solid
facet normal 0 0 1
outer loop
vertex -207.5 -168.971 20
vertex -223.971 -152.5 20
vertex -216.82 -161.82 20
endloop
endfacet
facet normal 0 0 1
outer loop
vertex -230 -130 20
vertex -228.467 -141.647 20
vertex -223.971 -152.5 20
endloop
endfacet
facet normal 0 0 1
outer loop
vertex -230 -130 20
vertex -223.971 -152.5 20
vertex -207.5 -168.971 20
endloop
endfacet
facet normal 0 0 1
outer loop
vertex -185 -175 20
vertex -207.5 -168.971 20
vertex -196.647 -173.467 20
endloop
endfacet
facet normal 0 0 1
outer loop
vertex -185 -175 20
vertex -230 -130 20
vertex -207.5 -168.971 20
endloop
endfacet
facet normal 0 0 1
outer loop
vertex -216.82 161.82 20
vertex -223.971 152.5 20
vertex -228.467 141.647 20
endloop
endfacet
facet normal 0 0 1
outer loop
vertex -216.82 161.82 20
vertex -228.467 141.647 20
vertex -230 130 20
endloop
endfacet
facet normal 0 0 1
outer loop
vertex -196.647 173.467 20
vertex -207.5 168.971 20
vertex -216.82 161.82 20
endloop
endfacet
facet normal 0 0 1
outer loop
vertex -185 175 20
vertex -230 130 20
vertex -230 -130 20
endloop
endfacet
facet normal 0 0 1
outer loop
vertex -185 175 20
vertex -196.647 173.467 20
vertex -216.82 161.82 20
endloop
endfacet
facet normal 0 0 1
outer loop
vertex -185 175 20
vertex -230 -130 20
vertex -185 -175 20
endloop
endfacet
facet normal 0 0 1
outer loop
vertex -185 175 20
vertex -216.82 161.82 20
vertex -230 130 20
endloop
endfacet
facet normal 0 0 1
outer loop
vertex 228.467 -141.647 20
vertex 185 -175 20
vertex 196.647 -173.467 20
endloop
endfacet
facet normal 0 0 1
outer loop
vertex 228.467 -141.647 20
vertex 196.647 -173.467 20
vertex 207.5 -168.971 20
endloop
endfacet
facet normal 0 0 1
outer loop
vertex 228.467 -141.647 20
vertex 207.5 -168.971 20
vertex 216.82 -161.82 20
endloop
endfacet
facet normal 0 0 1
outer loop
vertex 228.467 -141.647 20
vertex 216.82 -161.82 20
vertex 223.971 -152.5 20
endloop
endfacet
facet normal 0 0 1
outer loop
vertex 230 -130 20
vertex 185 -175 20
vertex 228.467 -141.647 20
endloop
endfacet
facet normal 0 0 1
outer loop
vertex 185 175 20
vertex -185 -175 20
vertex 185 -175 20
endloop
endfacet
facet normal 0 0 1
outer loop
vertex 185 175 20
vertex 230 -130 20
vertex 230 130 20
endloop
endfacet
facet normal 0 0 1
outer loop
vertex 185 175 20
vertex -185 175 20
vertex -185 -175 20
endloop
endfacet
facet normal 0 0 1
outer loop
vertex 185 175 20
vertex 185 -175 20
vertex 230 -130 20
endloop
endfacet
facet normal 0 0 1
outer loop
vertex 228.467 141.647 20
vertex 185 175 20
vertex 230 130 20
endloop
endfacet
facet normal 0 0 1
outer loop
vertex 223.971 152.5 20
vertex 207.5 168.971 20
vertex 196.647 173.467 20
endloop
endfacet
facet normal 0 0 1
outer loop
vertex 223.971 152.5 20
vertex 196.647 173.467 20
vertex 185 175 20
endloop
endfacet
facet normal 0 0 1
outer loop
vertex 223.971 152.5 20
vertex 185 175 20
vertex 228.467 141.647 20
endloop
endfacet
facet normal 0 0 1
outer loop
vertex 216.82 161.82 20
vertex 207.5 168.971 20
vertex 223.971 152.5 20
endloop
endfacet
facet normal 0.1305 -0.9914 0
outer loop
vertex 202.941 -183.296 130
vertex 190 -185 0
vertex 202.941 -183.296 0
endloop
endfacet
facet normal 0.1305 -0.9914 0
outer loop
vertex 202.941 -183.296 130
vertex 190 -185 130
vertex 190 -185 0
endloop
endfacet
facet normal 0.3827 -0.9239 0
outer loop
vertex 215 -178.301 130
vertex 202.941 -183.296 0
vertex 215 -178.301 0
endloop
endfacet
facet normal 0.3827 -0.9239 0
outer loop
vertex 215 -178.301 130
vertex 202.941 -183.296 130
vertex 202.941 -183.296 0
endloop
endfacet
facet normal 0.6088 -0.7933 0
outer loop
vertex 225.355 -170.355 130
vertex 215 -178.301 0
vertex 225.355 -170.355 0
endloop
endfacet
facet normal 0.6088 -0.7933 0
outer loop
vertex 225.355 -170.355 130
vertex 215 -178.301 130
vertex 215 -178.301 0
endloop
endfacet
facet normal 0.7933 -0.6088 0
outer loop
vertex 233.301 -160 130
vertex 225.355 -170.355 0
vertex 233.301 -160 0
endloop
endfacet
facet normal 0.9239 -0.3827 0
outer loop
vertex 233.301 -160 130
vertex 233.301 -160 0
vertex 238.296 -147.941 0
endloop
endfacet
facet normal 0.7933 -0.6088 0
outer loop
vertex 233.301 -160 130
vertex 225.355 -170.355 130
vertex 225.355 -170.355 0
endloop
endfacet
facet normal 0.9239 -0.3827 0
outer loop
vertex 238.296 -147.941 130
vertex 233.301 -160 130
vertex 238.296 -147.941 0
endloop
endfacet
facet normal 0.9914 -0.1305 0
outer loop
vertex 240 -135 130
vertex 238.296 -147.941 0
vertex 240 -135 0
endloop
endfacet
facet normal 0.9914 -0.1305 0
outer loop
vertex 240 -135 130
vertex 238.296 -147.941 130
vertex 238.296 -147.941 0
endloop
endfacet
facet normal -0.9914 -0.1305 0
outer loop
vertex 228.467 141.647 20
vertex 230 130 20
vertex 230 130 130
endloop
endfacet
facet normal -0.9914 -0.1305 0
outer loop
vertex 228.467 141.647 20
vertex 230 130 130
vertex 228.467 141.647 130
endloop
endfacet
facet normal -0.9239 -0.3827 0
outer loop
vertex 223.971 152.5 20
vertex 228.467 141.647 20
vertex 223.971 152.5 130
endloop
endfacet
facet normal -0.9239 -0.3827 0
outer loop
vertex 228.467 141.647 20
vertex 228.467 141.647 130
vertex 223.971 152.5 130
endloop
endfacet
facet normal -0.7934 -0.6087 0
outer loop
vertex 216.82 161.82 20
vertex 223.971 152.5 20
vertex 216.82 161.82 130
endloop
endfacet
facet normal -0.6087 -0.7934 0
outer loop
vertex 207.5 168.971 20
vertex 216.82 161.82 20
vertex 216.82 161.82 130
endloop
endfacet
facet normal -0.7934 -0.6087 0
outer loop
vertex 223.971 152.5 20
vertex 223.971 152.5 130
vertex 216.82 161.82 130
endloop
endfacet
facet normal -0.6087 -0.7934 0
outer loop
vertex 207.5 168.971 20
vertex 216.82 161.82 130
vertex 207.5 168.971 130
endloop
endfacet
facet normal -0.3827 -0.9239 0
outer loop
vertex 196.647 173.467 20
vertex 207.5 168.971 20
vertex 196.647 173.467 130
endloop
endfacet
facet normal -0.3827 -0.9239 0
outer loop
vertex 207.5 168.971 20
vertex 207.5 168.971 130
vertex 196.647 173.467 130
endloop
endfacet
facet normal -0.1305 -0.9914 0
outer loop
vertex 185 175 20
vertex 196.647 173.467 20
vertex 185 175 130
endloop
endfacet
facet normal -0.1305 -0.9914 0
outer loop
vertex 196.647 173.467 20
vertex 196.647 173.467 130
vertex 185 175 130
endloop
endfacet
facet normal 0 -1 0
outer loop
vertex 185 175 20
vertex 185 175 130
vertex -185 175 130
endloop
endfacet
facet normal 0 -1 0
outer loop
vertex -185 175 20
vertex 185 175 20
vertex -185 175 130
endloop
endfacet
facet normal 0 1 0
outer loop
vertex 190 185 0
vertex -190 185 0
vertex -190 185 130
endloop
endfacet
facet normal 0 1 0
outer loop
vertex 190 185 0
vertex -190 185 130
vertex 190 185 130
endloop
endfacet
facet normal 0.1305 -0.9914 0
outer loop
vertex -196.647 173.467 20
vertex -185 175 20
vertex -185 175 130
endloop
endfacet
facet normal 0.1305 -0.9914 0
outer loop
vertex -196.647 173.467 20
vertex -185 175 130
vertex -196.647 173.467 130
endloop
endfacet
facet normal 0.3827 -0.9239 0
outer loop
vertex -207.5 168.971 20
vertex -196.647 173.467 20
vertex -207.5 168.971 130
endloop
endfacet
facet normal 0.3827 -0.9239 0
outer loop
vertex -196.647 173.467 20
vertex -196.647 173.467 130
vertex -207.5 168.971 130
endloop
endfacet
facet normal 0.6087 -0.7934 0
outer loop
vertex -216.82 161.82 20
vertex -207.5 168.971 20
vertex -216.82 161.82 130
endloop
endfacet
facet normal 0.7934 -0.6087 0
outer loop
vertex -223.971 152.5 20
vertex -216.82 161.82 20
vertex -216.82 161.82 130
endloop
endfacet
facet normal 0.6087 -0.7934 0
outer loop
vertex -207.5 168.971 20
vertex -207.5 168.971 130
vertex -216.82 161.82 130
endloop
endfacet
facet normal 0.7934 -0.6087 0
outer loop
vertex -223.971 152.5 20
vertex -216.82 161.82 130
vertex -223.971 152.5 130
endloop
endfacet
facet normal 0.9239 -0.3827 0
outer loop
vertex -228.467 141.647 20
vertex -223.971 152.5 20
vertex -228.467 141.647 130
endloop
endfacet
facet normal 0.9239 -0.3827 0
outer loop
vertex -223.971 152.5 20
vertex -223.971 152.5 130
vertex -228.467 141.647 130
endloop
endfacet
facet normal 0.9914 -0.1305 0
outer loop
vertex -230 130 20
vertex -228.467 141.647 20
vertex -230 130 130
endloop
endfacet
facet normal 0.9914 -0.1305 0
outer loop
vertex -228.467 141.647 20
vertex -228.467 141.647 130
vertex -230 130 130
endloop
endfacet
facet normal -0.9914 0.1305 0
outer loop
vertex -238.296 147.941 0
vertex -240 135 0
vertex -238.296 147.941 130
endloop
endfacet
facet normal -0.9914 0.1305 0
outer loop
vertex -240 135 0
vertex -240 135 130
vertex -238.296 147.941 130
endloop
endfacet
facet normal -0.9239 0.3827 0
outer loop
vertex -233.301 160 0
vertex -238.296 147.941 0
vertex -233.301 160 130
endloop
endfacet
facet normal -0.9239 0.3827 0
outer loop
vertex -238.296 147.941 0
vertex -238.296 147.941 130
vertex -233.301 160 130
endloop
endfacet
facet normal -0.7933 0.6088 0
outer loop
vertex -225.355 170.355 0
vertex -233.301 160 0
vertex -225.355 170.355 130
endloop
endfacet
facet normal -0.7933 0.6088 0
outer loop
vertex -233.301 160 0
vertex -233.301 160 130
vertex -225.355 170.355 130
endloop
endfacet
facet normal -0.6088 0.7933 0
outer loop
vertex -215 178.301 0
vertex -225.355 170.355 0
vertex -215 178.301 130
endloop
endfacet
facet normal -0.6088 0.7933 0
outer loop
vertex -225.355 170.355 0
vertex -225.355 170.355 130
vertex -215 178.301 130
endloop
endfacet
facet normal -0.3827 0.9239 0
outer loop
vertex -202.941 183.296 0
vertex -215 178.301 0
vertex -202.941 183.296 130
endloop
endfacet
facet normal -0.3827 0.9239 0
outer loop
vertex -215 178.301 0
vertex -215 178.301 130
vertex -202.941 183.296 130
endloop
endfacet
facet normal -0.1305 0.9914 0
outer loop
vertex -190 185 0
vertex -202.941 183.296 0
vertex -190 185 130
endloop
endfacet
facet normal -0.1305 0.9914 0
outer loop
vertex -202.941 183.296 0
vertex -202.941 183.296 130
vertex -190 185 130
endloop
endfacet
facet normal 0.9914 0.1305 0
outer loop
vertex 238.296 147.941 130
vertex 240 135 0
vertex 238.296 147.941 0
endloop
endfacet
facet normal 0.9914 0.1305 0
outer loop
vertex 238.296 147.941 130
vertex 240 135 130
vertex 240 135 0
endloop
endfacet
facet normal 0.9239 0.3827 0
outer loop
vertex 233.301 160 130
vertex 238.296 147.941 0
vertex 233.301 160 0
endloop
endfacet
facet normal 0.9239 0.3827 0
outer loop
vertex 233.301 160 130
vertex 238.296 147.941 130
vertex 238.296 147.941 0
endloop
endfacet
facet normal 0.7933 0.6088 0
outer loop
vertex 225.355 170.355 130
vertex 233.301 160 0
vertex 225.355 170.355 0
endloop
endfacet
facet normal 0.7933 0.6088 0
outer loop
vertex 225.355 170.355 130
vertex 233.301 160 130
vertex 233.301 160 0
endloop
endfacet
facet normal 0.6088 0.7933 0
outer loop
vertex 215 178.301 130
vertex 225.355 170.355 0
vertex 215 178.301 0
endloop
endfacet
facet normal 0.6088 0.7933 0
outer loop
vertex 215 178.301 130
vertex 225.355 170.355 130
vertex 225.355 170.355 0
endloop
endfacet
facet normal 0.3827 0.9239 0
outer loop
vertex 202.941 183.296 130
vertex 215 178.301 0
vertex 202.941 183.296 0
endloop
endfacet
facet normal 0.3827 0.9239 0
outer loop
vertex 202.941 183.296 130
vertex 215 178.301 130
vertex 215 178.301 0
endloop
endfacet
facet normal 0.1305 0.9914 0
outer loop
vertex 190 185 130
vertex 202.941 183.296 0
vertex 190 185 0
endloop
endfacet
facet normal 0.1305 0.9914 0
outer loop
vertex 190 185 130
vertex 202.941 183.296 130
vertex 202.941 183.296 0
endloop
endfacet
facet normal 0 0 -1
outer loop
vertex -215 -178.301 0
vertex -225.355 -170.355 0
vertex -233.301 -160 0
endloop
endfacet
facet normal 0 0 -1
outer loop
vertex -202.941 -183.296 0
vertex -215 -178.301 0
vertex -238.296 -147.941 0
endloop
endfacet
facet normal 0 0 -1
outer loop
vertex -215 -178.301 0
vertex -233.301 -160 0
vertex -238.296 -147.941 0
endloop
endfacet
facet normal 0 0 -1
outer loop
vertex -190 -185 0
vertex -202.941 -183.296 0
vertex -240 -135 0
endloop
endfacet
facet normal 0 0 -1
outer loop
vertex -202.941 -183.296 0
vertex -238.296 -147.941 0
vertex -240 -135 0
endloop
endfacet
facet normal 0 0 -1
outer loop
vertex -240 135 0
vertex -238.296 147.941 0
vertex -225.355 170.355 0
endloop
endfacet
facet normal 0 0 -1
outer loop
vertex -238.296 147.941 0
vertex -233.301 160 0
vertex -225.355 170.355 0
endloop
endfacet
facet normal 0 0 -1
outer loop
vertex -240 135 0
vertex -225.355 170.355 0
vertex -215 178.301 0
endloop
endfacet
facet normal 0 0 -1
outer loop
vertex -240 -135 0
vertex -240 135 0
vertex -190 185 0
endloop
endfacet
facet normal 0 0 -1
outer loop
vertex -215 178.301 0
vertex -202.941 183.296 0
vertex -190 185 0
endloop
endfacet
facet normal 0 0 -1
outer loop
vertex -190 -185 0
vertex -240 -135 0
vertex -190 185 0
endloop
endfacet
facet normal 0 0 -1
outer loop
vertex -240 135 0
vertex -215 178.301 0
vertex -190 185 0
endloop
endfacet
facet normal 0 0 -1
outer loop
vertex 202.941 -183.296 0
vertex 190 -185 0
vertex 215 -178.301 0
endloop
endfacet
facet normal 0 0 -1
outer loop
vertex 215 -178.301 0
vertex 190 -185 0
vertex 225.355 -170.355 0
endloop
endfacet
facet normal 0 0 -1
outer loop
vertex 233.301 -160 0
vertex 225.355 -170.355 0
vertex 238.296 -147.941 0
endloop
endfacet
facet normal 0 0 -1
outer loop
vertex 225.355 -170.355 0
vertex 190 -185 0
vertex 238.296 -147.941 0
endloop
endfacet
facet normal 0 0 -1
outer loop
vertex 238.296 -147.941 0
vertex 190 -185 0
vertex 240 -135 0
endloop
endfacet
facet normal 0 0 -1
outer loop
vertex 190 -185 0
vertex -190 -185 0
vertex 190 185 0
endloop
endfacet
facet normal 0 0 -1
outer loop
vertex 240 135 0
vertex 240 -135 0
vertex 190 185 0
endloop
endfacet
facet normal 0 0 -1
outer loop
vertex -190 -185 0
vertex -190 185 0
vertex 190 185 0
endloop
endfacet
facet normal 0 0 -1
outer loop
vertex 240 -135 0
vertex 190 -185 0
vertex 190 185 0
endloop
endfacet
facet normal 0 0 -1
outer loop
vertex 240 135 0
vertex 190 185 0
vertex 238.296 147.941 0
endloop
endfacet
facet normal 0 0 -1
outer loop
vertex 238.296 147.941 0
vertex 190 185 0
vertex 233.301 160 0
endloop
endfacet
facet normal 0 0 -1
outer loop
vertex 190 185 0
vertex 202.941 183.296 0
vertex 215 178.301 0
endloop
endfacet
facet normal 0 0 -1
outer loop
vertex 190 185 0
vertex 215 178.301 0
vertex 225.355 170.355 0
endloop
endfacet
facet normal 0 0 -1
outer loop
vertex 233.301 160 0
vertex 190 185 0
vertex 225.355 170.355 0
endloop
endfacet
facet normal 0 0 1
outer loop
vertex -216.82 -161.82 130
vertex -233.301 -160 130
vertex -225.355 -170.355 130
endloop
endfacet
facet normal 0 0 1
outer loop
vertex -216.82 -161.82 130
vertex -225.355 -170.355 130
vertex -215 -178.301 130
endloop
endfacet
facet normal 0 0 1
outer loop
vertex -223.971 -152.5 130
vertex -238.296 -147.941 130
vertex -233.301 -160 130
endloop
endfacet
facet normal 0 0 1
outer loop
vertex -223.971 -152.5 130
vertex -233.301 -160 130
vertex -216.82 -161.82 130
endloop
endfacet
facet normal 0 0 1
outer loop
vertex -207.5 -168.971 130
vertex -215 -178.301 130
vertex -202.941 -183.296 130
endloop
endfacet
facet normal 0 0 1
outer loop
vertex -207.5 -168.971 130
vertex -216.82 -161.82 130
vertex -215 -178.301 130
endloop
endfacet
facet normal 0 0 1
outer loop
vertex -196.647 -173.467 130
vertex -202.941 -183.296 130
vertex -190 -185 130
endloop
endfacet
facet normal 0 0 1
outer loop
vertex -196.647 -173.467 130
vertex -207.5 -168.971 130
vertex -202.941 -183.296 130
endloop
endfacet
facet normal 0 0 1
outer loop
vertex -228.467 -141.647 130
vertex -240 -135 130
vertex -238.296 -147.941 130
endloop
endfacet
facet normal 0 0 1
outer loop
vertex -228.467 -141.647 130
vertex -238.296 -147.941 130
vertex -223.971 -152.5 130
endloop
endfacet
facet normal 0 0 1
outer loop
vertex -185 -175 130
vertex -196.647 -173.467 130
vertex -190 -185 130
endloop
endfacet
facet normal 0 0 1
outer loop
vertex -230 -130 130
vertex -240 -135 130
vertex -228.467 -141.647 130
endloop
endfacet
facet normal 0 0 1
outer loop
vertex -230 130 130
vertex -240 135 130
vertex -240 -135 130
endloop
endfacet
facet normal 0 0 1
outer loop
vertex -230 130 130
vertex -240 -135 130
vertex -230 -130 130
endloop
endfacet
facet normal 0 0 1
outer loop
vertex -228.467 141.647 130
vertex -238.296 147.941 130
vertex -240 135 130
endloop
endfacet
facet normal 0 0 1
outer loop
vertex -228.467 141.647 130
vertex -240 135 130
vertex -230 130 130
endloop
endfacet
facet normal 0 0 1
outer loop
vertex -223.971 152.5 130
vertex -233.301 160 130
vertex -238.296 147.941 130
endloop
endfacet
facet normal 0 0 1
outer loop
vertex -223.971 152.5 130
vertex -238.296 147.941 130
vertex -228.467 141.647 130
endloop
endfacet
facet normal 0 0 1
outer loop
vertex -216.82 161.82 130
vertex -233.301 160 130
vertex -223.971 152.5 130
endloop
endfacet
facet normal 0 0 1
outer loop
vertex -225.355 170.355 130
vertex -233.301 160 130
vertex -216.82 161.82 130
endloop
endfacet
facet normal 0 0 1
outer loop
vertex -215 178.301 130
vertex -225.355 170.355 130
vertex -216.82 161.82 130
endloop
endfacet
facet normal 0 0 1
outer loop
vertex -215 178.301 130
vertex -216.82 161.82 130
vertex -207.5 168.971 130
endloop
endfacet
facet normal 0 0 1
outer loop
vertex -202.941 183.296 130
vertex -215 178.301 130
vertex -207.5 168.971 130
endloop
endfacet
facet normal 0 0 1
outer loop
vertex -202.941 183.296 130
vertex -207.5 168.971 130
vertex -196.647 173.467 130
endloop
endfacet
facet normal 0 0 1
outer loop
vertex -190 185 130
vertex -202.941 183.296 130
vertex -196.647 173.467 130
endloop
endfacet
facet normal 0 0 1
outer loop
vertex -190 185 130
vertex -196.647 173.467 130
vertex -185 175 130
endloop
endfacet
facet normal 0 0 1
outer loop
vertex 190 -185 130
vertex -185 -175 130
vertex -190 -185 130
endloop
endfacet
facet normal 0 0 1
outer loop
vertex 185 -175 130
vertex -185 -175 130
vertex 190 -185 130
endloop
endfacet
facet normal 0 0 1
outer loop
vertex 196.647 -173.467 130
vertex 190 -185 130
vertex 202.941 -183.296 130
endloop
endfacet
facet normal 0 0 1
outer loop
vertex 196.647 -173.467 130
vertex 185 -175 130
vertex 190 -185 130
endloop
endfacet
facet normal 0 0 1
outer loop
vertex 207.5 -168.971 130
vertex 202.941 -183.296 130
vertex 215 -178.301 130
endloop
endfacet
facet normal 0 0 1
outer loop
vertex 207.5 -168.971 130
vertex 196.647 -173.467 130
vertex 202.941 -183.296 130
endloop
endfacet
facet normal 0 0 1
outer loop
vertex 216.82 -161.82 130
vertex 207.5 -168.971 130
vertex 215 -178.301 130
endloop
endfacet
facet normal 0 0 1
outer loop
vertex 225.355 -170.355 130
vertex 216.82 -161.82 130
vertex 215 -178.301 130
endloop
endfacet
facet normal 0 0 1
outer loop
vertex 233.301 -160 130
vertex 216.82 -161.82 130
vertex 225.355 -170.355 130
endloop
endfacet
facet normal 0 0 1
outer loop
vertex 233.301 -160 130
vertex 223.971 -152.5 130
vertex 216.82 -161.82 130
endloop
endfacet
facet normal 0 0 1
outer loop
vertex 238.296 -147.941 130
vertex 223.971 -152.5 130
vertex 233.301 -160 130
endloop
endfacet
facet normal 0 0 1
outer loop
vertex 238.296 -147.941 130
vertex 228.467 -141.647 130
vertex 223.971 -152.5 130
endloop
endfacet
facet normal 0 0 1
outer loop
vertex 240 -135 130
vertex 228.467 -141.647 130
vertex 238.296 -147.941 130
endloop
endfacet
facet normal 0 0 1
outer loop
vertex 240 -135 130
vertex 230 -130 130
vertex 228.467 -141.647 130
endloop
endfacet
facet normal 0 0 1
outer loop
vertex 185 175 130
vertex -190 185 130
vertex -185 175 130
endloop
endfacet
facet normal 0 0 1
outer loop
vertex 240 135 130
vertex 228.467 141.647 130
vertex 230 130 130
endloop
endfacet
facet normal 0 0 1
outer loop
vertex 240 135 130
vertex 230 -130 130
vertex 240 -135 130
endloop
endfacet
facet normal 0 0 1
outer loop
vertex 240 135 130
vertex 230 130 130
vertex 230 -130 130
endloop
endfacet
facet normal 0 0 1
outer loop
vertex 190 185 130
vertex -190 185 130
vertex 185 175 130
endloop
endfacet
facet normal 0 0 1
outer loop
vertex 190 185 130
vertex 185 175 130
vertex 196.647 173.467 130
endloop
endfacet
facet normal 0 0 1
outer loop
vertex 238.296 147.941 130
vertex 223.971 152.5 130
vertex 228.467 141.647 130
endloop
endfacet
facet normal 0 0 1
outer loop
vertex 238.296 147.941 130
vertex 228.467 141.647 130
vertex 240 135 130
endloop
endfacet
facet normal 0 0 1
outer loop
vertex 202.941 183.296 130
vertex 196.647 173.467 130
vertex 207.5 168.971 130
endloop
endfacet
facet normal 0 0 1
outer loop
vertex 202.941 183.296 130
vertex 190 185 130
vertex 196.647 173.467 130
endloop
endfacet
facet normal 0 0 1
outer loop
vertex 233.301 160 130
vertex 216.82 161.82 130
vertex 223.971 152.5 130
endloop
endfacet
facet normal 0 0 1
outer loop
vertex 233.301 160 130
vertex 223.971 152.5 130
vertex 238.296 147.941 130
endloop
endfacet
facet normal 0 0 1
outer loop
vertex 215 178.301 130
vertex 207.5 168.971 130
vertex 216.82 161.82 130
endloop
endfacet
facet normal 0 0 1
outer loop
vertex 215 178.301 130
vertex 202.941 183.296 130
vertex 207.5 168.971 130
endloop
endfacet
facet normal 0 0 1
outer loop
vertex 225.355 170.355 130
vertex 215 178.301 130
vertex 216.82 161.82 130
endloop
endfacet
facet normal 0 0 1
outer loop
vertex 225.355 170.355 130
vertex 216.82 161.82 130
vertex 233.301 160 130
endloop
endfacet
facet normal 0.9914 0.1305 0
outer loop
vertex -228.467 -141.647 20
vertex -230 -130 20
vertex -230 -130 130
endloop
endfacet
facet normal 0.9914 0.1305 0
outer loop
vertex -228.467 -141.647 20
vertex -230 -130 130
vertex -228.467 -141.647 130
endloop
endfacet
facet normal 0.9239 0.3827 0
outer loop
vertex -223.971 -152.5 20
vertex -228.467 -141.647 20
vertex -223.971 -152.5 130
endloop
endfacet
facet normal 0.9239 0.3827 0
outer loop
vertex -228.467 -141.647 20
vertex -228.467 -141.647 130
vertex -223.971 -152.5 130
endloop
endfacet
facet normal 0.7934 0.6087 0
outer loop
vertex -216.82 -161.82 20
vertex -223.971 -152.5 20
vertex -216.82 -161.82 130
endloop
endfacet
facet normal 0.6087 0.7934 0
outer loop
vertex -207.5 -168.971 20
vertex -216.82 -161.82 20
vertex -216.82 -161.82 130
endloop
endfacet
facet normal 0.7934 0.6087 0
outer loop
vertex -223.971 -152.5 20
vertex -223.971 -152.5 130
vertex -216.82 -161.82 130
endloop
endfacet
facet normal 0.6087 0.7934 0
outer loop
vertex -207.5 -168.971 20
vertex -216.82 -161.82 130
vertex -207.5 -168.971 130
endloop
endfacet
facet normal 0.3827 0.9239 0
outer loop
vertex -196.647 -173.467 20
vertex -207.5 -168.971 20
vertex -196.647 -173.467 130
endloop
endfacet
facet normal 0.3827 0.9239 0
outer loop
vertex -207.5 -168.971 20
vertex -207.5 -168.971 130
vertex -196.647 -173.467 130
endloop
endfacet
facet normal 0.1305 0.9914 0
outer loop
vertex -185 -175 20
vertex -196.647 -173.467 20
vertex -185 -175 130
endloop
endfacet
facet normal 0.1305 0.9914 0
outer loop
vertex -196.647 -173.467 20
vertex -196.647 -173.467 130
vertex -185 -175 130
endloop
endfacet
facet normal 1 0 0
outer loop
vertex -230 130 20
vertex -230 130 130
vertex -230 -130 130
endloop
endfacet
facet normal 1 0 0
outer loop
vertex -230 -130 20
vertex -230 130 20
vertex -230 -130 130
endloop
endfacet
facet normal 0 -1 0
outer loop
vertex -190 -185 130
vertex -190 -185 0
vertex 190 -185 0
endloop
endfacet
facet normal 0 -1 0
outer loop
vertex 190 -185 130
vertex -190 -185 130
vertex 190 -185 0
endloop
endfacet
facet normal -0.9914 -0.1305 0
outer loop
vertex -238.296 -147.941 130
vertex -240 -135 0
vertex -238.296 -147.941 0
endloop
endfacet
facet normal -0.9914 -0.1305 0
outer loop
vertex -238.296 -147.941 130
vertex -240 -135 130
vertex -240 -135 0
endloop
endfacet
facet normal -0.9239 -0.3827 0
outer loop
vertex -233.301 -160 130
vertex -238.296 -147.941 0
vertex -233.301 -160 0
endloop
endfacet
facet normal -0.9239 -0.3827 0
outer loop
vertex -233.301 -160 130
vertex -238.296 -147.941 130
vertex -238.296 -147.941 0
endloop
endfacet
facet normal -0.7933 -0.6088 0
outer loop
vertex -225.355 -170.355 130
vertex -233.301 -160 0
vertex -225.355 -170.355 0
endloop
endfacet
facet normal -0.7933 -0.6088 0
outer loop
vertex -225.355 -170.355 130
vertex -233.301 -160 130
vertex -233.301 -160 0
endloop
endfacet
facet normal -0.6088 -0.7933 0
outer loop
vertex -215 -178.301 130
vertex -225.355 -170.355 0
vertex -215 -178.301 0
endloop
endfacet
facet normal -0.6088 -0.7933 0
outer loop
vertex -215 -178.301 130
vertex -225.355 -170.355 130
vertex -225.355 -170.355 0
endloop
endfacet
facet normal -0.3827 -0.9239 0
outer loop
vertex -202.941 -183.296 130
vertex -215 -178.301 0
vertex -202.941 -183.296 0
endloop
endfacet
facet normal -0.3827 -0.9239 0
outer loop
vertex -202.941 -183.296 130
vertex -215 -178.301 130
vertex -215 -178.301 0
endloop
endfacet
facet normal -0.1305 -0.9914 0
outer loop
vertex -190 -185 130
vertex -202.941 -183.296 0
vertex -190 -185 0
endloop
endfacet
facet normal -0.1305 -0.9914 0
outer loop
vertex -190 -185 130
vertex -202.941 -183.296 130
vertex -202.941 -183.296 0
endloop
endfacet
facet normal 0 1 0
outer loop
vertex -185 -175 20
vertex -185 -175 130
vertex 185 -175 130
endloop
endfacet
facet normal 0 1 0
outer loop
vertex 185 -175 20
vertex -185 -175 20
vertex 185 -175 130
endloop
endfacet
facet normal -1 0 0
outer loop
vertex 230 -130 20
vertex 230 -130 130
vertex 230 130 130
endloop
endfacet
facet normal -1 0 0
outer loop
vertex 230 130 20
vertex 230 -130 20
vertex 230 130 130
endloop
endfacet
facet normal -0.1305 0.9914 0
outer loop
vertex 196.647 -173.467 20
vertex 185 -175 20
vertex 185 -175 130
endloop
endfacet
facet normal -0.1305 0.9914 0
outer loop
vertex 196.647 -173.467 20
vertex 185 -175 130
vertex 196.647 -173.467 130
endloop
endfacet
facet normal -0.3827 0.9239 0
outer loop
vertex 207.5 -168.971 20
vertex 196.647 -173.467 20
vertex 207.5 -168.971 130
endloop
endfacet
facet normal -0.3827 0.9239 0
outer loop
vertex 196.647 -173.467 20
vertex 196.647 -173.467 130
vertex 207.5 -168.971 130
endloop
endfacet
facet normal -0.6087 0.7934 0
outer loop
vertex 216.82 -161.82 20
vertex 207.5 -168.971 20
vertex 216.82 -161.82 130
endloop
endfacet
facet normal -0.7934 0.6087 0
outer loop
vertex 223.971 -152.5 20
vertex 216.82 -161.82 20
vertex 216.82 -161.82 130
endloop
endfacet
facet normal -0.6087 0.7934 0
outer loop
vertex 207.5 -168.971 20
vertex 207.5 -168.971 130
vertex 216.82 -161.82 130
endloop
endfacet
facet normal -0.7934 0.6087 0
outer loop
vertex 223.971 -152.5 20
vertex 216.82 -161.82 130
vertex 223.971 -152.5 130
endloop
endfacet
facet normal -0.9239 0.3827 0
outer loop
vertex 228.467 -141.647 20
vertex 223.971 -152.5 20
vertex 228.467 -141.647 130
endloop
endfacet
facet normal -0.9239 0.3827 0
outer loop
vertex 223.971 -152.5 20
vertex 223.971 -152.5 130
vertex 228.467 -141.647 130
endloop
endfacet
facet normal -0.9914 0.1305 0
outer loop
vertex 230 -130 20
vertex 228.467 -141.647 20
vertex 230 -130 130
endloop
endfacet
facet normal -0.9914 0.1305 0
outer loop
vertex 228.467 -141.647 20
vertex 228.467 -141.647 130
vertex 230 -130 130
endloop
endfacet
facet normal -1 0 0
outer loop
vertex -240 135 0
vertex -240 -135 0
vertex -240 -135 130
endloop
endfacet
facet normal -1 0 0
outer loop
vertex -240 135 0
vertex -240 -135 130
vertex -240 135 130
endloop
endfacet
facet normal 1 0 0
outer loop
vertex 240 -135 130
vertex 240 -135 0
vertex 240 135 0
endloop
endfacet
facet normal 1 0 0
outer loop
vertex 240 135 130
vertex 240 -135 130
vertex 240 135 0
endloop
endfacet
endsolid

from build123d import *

# Parameters (mm, degrees)
F0_W     = 480
F0_H     = 370
F1_DEPTH = 130
F2_R     = 50
F4_DEPTH = 110


with BuildPart() as f1:
    # F0 (on Top) → F1 (new body)
    with BuildSketch(Plane.XY):
        Rectangle(F0_W, F0_H)
    extrude(amount=F1_DEPTH)

    # F2
    f2_edges = [f1.edges().sort_by_distance(p)[0] for p in [
        (240, -185, 65),
        (-240, -185, 65),
        (240, 185, 65),
        (-240, 185, 65),
    ]]
    fillet(f2_edges, radius=F2_R)

    # F3 (on face) → F4 (cut)
    with BuildSketch(Plane.XY.offset(130)):
        with BuildLine():
            ThreePointArc((230, 130), (216.819805, 161.819805), (185, 175))
            Line((185, 175), (-185, 175))
            ThreePointArc((-185, 175), (-216.819805, 161.819805), (-230, 130))
            Line((-230, 130), (-230, -130))
            ThreePointArc((-230, -130), (-216.819805, -161.819805), (-185, -175))
            Line((-185, -175), (185, -175))
            ThreePointArc((185, -175), (216.819805, -161.819805), (230, -130))
            Line((230, -130), (230, 130))
        make_face()
    extrude(amount=-F4_DEPTH, mode=Mode.SUBTRACT)


solid = f1.part
